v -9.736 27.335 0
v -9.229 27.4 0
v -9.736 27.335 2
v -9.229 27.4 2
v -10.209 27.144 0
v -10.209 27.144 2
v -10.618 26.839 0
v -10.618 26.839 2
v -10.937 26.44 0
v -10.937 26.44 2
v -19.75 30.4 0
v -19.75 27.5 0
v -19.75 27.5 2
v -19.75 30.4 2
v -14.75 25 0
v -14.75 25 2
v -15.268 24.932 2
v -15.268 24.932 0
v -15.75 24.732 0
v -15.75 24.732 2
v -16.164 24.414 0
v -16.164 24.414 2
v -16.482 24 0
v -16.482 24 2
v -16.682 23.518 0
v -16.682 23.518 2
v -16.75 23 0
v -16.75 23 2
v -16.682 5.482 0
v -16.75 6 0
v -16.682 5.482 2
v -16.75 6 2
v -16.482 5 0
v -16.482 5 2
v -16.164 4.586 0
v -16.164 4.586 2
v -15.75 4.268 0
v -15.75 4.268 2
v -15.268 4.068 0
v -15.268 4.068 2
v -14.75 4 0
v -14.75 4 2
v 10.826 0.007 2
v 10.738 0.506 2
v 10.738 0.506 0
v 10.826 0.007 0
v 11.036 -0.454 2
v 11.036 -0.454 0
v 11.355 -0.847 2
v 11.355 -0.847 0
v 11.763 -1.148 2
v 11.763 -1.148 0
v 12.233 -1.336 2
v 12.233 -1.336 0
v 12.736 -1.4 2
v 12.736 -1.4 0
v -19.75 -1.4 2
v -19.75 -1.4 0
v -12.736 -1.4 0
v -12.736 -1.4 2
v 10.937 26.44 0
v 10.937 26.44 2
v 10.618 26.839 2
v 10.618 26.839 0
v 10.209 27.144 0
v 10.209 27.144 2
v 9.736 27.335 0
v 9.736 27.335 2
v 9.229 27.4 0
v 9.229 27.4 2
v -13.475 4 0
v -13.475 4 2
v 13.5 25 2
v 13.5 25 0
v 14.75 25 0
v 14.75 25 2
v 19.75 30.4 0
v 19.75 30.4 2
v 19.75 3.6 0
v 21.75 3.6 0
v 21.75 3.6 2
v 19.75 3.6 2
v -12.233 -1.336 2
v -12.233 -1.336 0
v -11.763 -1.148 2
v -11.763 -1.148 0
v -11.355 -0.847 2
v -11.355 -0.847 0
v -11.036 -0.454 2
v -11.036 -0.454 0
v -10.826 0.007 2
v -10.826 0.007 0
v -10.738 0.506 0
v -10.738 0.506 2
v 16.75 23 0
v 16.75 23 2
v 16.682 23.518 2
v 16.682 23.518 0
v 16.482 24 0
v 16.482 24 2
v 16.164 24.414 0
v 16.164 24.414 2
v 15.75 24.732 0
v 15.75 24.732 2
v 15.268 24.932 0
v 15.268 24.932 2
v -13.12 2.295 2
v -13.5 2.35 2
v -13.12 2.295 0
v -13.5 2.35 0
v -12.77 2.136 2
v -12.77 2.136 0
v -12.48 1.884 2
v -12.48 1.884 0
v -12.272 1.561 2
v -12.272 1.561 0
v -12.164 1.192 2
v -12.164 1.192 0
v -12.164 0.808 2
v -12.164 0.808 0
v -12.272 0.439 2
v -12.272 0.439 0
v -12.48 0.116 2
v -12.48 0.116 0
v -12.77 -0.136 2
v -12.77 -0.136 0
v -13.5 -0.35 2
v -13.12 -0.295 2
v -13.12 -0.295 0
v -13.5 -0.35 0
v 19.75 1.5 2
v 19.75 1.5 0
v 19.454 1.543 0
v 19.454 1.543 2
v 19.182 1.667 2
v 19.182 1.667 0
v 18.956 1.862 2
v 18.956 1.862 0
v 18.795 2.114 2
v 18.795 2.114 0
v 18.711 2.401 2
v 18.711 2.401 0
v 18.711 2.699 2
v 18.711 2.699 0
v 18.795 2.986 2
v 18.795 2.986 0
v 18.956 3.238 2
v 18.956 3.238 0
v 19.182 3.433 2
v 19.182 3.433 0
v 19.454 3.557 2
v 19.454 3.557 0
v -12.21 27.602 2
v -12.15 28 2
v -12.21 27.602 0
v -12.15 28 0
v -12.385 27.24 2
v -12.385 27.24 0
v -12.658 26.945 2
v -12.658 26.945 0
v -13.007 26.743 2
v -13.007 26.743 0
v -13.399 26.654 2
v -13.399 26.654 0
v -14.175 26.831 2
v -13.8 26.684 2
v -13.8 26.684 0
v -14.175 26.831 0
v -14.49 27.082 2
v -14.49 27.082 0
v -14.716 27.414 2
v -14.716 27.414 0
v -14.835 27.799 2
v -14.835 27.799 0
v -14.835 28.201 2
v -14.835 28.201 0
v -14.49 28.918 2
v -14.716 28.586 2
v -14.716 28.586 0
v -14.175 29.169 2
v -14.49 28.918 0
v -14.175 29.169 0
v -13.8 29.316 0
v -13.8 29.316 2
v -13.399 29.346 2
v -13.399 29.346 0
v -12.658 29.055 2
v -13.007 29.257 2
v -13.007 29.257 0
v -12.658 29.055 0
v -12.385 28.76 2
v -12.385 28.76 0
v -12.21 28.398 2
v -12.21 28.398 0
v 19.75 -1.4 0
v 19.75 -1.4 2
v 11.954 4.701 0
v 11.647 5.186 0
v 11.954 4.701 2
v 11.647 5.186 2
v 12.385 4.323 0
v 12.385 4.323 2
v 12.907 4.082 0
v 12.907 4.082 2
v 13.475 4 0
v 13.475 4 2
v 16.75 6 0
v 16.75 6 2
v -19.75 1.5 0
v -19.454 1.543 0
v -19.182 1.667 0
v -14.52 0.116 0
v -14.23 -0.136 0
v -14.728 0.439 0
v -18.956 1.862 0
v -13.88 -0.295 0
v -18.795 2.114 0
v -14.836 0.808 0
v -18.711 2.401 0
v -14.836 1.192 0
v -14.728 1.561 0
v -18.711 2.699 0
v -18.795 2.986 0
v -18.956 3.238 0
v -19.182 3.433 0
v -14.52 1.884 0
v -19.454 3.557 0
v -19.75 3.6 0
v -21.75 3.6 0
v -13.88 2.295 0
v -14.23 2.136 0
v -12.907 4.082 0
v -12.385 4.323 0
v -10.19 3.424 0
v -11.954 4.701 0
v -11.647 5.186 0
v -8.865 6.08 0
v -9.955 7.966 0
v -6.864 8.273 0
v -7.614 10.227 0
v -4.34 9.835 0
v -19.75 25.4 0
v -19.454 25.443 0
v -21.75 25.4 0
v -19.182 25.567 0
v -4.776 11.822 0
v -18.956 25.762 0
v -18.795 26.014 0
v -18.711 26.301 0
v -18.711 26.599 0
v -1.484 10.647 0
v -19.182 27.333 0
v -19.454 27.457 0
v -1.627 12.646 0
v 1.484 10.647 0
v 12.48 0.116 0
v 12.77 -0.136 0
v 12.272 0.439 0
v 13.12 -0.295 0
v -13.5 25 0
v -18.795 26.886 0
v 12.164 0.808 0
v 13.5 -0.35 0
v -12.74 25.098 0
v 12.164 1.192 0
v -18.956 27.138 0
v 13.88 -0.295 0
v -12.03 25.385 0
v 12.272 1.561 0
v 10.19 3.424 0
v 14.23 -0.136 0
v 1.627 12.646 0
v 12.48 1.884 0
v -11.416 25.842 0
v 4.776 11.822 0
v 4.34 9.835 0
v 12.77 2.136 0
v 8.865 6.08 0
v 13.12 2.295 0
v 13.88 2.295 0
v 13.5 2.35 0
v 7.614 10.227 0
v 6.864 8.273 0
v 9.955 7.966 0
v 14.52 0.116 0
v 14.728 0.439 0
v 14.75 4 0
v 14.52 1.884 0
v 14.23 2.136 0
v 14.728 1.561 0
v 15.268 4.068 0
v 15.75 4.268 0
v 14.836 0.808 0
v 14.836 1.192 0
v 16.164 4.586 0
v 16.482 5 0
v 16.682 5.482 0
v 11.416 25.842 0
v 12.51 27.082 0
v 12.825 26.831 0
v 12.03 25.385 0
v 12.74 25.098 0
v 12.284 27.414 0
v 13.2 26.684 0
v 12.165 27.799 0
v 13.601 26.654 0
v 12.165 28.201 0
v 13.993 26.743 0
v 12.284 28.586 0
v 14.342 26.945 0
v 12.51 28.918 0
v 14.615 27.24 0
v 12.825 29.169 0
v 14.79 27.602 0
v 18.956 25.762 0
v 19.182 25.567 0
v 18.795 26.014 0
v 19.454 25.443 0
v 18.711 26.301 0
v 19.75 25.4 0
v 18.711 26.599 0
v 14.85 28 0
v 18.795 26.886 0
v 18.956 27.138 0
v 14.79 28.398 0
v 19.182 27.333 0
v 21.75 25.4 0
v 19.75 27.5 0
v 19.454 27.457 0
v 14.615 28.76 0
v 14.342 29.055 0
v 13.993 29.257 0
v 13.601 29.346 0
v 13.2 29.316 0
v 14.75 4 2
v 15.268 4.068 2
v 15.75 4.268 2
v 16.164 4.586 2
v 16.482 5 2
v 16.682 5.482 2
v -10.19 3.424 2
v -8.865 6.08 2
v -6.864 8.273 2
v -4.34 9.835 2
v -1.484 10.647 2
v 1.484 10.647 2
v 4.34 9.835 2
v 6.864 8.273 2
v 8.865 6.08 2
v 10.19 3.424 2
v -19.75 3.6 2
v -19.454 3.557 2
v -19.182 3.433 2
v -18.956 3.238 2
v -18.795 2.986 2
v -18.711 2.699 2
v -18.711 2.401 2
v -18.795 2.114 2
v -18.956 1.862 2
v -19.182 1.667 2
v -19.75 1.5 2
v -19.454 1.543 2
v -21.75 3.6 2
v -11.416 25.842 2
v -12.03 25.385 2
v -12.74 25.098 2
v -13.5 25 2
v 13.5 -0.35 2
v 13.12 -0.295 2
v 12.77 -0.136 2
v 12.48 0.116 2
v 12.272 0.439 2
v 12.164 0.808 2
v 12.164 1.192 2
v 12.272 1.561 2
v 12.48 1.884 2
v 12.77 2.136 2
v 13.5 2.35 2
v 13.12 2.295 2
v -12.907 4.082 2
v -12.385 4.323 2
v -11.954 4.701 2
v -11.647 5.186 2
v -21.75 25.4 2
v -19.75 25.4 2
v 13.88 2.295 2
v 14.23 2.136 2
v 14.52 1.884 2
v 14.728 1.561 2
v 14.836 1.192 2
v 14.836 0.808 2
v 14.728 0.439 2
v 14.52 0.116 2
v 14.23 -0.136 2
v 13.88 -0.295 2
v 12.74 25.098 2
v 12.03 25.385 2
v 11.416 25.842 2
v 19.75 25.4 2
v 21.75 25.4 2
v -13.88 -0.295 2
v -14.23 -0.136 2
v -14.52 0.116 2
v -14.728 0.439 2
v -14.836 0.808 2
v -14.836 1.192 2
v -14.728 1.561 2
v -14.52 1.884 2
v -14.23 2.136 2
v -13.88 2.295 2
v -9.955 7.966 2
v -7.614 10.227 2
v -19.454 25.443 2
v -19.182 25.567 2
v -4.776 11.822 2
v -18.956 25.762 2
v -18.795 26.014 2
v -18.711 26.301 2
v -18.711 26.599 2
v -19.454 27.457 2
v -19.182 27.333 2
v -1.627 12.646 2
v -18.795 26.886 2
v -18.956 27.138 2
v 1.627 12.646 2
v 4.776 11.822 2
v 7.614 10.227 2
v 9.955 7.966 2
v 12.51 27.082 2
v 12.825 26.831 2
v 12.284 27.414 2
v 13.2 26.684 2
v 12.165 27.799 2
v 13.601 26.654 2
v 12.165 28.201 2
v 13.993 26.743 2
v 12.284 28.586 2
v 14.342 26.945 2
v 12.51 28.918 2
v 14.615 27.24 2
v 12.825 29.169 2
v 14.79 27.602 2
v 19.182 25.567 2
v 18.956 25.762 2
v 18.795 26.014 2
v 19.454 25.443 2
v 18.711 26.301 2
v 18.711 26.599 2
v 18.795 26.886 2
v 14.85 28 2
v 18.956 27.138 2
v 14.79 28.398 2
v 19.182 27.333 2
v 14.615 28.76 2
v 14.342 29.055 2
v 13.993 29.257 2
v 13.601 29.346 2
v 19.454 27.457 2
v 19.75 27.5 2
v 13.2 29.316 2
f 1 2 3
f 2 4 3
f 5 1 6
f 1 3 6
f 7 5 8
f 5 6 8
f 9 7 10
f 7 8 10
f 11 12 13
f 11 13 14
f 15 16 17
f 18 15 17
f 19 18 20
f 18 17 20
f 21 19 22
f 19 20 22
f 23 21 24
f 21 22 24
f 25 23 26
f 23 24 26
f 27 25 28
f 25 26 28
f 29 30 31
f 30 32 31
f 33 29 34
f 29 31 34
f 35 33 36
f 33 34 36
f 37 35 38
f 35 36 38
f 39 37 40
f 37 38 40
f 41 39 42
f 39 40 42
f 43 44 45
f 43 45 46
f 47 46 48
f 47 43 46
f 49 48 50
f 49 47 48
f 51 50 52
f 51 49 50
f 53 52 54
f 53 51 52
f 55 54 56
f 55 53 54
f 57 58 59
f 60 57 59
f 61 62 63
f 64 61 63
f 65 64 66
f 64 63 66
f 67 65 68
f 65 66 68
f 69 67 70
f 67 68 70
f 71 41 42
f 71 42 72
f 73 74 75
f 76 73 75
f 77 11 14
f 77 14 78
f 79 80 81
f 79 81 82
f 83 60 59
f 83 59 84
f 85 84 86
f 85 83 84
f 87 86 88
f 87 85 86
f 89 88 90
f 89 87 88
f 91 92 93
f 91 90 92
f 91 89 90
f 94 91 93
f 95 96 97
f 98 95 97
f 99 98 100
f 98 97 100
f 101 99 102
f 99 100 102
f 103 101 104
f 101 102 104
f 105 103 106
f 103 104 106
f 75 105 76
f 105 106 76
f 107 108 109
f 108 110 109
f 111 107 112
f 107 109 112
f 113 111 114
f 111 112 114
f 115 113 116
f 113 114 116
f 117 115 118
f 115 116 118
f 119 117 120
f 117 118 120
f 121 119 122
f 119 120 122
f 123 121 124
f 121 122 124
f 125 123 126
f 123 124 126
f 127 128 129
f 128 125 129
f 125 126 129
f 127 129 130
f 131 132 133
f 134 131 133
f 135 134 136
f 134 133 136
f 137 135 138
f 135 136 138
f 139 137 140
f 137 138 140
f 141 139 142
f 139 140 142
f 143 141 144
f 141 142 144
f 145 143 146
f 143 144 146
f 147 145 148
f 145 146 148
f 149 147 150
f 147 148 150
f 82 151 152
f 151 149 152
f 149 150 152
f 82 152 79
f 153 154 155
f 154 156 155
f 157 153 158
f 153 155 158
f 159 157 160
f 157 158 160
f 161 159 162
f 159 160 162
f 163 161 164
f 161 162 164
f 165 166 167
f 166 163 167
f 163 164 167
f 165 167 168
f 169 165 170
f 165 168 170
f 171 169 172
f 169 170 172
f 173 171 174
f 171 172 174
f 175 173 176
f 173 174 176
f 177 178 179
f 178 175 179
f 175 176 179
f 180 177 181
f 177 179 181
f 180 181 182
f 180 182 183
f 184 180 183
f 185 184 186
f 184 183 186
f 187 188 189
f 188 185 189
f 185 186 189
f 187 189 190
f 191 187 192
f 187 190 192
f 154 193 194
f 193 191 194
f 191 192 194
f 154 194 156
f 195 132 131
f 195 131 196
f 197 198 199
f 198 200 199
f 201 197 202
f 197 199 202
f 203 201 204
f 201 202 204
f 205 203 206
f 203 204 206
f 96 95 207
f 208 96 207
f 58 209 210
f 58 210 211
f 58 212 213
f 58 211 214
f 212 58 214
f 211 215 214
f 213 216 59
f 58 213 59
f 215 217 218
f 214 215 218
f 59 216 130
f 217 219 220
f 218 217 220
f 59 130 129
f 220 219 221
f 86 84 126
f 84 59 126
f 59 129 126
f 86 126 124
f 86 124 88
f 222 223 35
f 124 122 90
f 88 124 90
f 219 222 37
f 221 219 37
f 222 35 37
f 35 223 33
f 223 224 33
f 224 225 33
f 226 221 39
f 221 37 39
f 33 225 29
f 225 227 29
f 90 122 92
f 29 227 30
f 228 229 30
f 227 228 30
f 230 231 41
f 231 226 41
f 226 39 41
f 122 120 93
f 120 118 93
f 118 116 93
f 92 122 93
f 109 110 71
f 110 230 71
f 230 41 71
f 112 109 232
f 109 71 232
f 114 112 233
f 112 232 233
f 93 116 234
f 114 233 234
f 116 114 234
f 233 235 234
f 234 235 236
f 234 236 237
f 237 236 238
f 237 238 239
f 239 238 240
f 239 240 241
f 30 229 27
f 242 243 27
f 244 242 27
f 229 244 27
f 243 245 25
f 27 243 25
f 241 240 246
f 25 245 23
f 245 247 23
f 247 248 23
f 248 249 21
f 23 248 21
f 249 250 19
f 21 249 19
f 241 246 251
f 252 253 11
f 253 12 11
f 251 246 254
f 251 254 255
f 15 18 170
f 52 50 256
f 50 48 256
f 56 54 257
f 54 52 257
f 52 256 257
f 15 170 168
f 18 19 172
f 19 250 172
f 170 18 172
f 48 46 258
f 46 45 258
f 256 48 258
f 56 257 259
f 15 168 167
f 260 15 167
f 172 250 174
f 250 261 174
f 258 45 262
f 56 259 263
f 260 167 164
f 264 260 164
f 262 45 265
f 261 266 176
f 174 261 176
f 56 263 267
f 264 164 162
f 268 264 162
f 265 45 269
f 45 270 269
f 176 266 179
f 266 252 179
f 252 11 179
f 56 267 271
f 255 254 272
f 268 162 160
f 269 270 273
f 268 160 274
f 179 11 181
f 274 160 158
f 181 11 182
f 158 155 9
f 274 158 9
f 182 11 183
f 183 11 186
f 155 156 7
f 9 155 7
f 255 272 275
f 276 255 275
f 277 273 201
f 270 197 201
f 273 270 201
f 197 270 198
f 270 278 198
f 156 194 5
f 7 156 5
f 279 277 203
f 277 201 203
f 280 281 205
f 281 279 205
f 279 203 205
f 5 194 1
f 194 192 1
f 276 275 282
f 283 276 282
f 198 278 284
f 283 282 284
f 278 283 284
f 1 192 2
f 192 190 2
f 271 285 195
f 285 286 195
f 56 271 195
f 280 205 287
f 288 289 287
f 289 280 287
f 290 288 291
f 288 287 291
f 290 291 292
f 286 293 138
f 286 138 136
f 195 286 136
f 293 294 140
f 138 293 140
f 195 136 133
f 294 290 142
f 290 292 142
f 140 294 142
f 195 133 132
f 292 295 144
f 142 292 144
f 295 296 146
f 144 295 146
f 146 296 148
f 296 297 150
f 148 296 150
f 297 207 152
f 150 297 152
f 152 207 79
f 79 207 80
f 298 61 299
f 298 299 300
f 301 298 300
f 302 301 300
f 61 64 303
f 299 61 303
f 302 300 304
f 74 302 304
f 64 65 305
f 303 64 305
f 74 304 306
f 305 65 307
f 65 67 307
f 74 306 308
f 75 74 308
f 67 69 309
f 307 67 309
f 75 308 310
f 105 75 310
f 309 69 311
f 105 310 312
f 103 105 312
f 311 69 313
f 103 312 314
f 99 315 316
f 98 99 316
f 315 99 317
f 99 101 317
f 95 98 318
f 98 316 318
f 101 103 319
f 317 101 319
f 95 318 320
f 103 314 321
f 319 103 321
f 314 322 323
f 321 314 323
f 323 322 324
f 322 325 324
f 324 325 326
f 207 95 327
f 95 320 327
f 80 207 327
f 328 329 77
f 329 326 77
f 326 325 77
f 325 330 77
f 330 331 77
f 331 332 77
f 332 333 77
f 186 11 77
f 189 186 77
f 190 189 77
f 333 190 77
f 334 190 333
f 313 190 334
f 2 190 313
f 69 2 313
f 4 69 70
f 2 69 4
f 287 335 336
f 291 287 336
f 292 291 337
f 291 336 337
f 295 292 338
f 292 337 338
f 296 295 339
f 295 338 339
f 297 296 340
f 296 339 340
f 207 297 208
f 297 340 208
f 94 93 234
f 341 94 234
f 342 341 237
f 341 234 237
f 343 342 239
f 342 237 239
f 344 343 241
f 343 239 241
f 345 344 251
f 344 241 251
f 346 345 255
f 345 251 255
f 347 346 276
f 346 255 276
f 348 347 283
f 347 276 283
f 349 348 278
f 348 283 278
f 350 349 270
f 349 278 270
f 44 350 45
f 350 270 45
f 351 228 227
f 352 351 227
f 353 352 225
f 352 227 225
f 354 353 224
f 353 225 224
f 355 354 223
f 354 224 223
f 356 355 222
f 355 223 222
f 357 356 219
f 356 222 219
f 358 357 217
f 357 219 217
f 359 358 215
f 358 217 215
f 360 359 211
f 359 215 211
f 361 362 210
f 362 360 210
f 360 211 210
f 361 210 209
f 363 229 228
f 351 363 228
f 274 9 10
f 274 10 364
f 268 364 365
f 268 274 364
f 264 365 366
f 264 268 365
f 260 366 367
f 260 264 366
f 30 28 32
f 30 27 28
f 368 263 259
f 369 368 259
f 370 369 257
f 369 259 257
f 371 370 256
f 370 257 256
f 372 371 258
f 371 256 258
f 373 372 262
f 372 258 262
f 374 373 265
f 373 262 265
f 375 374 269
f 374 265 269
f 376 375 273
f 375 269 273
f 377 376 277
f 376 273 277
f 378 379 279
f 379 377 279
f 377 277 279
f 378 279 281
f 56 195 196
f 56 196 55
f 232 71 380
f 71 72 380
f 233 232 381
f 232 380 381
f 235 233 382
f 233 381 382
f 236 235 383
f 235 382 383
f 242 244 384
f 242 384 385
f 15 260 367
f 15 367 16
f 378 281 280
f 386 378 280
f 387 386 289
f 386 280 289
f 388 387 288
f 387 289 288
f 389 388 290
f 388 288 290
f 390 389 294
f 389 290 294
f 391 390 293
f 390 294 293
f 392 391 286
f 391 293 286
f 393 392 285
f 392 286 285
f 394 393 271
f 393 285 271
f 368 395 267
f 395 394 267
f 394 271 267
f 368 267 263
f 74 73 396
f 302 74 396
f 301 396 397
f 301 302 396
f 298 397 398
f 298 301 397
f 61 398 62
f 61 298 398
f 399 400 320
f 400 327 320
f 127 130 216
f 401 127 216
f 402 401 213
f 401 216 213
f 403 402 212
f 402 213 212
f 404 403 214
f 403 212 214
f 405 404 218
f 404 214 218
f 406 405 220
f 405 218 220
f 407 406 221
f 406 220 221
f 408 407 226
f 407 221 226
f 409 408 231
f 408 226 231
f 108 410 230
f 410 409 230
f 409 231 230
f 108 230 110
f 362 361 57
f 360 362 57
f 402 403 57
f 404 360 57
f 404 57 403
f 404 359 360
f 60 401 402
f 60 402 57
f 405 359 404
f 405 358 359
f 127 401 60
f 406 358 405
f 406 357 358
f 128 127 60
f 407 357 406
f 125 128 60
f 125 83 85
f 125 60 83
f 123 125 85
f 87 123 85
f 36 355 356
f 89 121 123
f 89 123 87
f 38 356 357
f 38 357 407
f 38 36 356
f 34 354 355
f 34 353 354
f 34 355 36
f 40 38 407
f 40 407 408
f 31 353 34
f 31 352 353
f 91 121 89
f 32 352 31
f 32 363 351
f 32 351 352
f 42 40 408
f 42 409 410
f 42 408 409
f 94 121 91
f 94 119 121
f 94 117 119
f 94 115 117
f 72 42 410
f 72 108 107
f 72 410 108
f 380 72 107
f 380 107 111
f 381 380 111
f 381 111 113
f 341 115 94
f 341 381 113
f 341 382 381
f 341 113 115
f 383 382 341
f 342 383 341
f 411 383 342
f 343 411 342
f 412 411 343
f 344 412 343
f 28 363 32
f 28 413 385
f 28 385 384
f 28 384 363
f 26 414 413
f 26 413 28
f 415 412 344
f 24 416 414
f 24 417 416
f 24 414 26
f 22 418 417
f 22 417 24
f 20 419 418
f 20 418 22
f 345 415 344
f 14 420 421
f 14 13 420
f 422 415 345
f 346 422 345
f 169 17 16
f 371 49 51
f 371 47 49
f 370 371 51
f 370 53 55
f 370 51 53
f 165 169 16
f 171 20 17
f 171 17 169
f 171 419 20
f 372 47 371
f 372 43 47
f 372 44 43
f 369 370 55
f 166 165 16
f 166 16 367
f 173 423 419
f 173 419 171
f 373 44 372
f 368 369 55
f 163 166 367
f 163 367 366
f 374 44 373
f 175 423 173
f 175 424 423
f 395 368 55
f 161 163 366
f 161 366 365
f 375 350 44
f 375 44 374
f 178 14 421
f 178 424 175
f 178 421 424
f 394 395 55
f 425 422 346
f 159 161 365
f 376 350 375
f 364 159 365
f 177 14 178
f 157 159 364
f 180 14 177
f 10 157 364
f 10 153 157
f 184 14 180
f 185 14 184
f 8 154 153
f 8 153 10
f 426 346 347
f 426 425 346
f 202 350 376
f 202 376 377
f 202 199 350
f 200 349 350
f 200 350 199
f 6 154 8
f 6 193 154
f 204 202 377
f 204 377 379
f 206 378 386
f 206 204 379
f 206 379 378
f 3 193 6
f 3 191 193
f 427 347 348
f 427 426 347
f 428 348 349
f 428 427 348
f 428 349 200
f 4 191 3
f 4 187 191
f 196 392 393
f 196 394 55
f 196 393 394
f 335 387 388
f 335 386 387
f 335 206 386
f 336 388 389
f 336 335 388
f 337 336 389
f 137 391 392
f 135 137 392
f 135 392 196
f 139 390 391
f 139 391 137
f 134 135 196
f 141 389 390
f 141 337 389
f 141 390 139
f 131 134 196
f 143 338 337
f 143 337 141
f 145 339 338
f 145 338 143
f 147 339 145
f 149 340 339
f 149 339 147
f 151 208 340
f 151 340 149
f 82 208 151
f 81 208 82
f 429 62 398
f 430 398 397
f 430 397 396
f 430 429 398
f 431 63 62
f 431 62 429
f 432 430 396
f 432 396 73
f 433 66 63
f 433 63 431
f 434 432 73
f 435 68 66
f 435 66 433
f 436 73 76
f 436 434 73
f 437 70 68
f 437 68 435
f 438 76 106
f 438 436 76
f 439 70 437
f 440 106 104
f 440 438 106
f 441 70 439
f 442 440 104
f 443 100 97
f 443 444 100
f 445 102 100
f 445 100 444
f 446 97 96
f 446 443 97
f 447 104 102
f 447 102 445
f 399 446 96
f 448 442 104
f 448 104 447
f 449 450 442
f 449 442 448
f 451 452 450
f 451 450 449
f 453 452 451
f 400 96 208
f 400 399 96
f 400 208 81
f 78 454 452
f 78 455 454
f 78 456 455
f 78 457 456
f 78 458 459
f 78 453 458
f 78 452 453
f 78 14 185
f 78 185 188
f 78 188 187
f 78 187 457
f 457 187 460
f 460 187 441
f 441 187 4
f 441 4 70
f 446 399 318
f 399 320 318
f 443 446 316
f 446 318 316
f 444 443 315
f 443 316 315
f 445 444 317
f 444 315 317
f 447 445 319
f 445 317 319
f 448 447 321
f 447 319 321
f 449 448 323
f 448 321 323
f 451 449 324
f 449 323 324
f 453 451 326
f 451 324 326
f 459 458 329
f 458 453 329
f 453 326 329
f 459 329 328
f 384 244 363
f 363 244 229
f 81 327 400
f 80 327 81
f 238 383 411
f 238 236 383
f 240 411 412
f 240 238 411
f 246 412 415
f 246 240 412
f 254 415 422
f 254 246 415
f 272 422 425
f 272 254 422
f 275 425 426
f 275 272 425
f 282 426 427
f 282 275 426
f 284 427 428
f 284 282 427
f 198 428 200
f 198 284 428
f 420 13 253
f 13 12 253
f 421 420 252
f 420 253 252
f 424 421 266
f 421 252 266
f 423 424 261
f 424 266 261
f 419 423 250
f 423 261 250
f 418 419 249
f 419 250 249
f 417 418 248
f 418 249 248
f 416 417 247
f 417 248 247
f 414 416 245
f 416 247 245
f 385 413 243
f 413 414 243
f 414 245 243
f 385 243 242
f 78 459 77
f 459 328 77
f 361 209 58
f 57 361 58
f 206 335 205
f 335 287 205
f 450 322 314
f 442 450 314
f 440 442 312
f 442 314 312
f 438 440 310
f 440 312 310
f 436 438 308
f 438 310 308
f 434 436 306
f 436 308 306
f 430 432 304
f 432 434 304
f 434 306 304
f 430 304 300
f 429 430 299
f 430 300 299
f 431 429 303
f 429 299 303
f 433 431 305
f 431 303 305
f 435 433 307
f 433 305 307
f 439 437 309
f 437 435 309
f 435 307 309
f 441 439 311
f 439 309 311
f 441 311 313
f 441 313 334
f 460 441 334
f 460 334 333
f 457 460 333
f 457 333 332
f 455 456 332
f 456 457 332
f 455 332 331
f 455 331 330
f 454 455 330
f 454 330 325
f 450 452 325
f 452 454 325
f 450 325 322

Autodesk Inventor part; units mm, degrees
ref_plane "YZ Plane" through (0, 0, 0) normal (1, 0, 0) x (0, 1, 0)
ref_plane "XZ Plane" through (0, 0, 0) normal (0, 1, 0) x (-1, 0, 0)
ref_plane "XY Plane" through (0, 0, 0) normal (0, 0, 1) x (1, 0, 0)
sketch "スケッチ1" plane through (0, 0, 0) normal (0, 0, 1) x (1, 0, 0)
  circle A0 centre (0, 0) radius 10.5 construction
  line L0 (-13.5, 28) -> (13.5, 28) construction
  line L1 (13.5, 28) -> (13.5, 1) construction
  line L2 (13.5, 1) -> (-13.5, 1) construction
  line L3 (-13.5, 1) -> (-13.5, 28) construction
  line L4 (-13.5, 28) -> (13.5, 1) construction
  line L5 (13.5, 28) -> (-13.5, 1) construction
  line L6 (-13.5, 14.5) -> (13.5, 14.5) construction
  line L7 (0, 28) -> (0, 1) construction
  circle A1 centre (-13.5, 28) radius 1.35
  circle A2 centre (-13.5, 1) radius 2.4 construction
  circle A3 centre (-13.5, 28) radius 2.4 construction
  line L8 (-19.75, 30.4) -> (19.75, 30.4)
  line L9 (-21.75, 25.4) -> (-21.75, 3.6)
  line L10 (-21.75, 25.4) -> (-19.75, 25.4)
  arc A4 (-19.75, 25.4) -> (-19.75, 27.5) centre (-19.75, 26.45) ccw
  line L11 (-19.75, 27.5) -> (-19.75, 30.4)
  line L12 (-21.75, 3.6) -> (-19.75, 3.6)
  arc A5 (-19.75, 1.5) -> (-19.75, 3.6) centre (-19.75, 2.55) ccw
  line L13 (-19.75, 1.5) -> (-19.75, -1.4)
  line L14 (-19.75, -1.4) -> (-10.6584, -1.4)
  line L15 (21.75, 25.4) -> (21.75, 3.6)
  arc A6 (19.75, 27.5) -> (19.75, 25.4) centre (19.75, 26.45) ccw
  line L16 (19.75, 27.5) -> (19.75, 30.4)
  arc A7 (19.75, 3.6) -> (19.75, 1.5) centre (19.75, 2.55) ccw
  line L17 (21.75, 3.6) -> (19.75, 3.6)
  line L18 (19.75, 1.5) -> (19.75, -1.4)
  line L19 (19.75, -1.4) -> (10.6584, -1.4)
  line L20 (21.75, 25.4) -> (19.75, 25.4)
  arc A8 (10.6584, -1.4) -> (-10.6584, -1.4) centre (0, 0) ccw
  circle A9 centre (13.5, 28) radius 1.35
  line L21 (10.5606, 27.4) -> (-10.5606, 27.4)
  arc A10 (-13.5, 25) -> (-10.5606, 27.4) centre (-13.5, 28) ccw
  line L22 (-13.5, 25) -> (-16.75, 25)
  line L23 (-16.75, 25) -> (-16.75, 4)
  arc A11 (12.1063, 4) -> (-12.1063, 4) centre (0, 0) ccw
  line L24 (-16.75, 4) -> (-12.1063, 4)
  arc A12 (10.5606, 27.4) -> (13.5, 25) centre (13.5, 28) ccw
  line L25 (13.5, 25) -> (16.75, 25)
  line L26 (16.75, 25) -> (16.75, 4)
  line L27 (16.75, 4) -> (12.1063, 4)
  line L28 (-13.5, 2.35) -> (-13.5, 2.35)
  line L29 (-13.5, -0.35) -> (-13.5, -0.35)
  arc A13 (-13.5, -0.35) -> (-13.5, 2.35) centre (-13.5, 1) ccw
  arc A14 (-13.5, 2.35) -> (-13.5, -0.35) centre (-13.5, 1) ccw
  line L30 (13.5, -0.35) -> (13.5, -0.35)
  arc A15 (13.5, 2.35) -> (13.5, -0.35) centre (13.5, 1) ccw
  arc A16 (13.5, -0.35) -> (13.5, 2.35) centre (13.5, 1) ccw
  line L31 (13.5, 2.35) -> (13.5, 2.35)
  point P0 (0, 14.5)
  dimension "d0" = 21
  dimension "d3" = 27
  dimension "d4" = 27
  dimension "d6" = 1
  dimension "d7" = 4.8
  dimension "d8" = 2
  dimension "d9" = 1.05
  dimension "d10" = 39.5
  dimension "d11" = 5
  dimension "d12" = 5
  dimension "d13" = 21.8
  dimension "d14" = 0.25
  dimension "d15" = 3
  dimension "d16" = 3
  dimension "d17" = 3
  dimension "d18" = 2
  dimension "d24" = 2.7
  dimension "d25" = 1.35
  dimension "d26" = 0
extrude "押し出し1" add sketch "スケッチ1" along normal blind 2
fillet "フィレット1" radius 2 2 edges at (-10.6584, -1.4, 1) (10.6584, -1.4, 1)
fillet "フィレット2" radius 2 8 edges at (-16.75, 4, 1) (-16.75, 25, 1) (-10.5606, 27.4, 1) (10.5606, 27.4, 1) (16.75, 25, 1) (16.75, 4, 1) (12.1063, 4, 1) (-12.1063, 4, 1)
equation "\"d25\" = 0.5 * d24"
properties part number "Ankle_back_frame" material "アルミニウム 2014-T4"
